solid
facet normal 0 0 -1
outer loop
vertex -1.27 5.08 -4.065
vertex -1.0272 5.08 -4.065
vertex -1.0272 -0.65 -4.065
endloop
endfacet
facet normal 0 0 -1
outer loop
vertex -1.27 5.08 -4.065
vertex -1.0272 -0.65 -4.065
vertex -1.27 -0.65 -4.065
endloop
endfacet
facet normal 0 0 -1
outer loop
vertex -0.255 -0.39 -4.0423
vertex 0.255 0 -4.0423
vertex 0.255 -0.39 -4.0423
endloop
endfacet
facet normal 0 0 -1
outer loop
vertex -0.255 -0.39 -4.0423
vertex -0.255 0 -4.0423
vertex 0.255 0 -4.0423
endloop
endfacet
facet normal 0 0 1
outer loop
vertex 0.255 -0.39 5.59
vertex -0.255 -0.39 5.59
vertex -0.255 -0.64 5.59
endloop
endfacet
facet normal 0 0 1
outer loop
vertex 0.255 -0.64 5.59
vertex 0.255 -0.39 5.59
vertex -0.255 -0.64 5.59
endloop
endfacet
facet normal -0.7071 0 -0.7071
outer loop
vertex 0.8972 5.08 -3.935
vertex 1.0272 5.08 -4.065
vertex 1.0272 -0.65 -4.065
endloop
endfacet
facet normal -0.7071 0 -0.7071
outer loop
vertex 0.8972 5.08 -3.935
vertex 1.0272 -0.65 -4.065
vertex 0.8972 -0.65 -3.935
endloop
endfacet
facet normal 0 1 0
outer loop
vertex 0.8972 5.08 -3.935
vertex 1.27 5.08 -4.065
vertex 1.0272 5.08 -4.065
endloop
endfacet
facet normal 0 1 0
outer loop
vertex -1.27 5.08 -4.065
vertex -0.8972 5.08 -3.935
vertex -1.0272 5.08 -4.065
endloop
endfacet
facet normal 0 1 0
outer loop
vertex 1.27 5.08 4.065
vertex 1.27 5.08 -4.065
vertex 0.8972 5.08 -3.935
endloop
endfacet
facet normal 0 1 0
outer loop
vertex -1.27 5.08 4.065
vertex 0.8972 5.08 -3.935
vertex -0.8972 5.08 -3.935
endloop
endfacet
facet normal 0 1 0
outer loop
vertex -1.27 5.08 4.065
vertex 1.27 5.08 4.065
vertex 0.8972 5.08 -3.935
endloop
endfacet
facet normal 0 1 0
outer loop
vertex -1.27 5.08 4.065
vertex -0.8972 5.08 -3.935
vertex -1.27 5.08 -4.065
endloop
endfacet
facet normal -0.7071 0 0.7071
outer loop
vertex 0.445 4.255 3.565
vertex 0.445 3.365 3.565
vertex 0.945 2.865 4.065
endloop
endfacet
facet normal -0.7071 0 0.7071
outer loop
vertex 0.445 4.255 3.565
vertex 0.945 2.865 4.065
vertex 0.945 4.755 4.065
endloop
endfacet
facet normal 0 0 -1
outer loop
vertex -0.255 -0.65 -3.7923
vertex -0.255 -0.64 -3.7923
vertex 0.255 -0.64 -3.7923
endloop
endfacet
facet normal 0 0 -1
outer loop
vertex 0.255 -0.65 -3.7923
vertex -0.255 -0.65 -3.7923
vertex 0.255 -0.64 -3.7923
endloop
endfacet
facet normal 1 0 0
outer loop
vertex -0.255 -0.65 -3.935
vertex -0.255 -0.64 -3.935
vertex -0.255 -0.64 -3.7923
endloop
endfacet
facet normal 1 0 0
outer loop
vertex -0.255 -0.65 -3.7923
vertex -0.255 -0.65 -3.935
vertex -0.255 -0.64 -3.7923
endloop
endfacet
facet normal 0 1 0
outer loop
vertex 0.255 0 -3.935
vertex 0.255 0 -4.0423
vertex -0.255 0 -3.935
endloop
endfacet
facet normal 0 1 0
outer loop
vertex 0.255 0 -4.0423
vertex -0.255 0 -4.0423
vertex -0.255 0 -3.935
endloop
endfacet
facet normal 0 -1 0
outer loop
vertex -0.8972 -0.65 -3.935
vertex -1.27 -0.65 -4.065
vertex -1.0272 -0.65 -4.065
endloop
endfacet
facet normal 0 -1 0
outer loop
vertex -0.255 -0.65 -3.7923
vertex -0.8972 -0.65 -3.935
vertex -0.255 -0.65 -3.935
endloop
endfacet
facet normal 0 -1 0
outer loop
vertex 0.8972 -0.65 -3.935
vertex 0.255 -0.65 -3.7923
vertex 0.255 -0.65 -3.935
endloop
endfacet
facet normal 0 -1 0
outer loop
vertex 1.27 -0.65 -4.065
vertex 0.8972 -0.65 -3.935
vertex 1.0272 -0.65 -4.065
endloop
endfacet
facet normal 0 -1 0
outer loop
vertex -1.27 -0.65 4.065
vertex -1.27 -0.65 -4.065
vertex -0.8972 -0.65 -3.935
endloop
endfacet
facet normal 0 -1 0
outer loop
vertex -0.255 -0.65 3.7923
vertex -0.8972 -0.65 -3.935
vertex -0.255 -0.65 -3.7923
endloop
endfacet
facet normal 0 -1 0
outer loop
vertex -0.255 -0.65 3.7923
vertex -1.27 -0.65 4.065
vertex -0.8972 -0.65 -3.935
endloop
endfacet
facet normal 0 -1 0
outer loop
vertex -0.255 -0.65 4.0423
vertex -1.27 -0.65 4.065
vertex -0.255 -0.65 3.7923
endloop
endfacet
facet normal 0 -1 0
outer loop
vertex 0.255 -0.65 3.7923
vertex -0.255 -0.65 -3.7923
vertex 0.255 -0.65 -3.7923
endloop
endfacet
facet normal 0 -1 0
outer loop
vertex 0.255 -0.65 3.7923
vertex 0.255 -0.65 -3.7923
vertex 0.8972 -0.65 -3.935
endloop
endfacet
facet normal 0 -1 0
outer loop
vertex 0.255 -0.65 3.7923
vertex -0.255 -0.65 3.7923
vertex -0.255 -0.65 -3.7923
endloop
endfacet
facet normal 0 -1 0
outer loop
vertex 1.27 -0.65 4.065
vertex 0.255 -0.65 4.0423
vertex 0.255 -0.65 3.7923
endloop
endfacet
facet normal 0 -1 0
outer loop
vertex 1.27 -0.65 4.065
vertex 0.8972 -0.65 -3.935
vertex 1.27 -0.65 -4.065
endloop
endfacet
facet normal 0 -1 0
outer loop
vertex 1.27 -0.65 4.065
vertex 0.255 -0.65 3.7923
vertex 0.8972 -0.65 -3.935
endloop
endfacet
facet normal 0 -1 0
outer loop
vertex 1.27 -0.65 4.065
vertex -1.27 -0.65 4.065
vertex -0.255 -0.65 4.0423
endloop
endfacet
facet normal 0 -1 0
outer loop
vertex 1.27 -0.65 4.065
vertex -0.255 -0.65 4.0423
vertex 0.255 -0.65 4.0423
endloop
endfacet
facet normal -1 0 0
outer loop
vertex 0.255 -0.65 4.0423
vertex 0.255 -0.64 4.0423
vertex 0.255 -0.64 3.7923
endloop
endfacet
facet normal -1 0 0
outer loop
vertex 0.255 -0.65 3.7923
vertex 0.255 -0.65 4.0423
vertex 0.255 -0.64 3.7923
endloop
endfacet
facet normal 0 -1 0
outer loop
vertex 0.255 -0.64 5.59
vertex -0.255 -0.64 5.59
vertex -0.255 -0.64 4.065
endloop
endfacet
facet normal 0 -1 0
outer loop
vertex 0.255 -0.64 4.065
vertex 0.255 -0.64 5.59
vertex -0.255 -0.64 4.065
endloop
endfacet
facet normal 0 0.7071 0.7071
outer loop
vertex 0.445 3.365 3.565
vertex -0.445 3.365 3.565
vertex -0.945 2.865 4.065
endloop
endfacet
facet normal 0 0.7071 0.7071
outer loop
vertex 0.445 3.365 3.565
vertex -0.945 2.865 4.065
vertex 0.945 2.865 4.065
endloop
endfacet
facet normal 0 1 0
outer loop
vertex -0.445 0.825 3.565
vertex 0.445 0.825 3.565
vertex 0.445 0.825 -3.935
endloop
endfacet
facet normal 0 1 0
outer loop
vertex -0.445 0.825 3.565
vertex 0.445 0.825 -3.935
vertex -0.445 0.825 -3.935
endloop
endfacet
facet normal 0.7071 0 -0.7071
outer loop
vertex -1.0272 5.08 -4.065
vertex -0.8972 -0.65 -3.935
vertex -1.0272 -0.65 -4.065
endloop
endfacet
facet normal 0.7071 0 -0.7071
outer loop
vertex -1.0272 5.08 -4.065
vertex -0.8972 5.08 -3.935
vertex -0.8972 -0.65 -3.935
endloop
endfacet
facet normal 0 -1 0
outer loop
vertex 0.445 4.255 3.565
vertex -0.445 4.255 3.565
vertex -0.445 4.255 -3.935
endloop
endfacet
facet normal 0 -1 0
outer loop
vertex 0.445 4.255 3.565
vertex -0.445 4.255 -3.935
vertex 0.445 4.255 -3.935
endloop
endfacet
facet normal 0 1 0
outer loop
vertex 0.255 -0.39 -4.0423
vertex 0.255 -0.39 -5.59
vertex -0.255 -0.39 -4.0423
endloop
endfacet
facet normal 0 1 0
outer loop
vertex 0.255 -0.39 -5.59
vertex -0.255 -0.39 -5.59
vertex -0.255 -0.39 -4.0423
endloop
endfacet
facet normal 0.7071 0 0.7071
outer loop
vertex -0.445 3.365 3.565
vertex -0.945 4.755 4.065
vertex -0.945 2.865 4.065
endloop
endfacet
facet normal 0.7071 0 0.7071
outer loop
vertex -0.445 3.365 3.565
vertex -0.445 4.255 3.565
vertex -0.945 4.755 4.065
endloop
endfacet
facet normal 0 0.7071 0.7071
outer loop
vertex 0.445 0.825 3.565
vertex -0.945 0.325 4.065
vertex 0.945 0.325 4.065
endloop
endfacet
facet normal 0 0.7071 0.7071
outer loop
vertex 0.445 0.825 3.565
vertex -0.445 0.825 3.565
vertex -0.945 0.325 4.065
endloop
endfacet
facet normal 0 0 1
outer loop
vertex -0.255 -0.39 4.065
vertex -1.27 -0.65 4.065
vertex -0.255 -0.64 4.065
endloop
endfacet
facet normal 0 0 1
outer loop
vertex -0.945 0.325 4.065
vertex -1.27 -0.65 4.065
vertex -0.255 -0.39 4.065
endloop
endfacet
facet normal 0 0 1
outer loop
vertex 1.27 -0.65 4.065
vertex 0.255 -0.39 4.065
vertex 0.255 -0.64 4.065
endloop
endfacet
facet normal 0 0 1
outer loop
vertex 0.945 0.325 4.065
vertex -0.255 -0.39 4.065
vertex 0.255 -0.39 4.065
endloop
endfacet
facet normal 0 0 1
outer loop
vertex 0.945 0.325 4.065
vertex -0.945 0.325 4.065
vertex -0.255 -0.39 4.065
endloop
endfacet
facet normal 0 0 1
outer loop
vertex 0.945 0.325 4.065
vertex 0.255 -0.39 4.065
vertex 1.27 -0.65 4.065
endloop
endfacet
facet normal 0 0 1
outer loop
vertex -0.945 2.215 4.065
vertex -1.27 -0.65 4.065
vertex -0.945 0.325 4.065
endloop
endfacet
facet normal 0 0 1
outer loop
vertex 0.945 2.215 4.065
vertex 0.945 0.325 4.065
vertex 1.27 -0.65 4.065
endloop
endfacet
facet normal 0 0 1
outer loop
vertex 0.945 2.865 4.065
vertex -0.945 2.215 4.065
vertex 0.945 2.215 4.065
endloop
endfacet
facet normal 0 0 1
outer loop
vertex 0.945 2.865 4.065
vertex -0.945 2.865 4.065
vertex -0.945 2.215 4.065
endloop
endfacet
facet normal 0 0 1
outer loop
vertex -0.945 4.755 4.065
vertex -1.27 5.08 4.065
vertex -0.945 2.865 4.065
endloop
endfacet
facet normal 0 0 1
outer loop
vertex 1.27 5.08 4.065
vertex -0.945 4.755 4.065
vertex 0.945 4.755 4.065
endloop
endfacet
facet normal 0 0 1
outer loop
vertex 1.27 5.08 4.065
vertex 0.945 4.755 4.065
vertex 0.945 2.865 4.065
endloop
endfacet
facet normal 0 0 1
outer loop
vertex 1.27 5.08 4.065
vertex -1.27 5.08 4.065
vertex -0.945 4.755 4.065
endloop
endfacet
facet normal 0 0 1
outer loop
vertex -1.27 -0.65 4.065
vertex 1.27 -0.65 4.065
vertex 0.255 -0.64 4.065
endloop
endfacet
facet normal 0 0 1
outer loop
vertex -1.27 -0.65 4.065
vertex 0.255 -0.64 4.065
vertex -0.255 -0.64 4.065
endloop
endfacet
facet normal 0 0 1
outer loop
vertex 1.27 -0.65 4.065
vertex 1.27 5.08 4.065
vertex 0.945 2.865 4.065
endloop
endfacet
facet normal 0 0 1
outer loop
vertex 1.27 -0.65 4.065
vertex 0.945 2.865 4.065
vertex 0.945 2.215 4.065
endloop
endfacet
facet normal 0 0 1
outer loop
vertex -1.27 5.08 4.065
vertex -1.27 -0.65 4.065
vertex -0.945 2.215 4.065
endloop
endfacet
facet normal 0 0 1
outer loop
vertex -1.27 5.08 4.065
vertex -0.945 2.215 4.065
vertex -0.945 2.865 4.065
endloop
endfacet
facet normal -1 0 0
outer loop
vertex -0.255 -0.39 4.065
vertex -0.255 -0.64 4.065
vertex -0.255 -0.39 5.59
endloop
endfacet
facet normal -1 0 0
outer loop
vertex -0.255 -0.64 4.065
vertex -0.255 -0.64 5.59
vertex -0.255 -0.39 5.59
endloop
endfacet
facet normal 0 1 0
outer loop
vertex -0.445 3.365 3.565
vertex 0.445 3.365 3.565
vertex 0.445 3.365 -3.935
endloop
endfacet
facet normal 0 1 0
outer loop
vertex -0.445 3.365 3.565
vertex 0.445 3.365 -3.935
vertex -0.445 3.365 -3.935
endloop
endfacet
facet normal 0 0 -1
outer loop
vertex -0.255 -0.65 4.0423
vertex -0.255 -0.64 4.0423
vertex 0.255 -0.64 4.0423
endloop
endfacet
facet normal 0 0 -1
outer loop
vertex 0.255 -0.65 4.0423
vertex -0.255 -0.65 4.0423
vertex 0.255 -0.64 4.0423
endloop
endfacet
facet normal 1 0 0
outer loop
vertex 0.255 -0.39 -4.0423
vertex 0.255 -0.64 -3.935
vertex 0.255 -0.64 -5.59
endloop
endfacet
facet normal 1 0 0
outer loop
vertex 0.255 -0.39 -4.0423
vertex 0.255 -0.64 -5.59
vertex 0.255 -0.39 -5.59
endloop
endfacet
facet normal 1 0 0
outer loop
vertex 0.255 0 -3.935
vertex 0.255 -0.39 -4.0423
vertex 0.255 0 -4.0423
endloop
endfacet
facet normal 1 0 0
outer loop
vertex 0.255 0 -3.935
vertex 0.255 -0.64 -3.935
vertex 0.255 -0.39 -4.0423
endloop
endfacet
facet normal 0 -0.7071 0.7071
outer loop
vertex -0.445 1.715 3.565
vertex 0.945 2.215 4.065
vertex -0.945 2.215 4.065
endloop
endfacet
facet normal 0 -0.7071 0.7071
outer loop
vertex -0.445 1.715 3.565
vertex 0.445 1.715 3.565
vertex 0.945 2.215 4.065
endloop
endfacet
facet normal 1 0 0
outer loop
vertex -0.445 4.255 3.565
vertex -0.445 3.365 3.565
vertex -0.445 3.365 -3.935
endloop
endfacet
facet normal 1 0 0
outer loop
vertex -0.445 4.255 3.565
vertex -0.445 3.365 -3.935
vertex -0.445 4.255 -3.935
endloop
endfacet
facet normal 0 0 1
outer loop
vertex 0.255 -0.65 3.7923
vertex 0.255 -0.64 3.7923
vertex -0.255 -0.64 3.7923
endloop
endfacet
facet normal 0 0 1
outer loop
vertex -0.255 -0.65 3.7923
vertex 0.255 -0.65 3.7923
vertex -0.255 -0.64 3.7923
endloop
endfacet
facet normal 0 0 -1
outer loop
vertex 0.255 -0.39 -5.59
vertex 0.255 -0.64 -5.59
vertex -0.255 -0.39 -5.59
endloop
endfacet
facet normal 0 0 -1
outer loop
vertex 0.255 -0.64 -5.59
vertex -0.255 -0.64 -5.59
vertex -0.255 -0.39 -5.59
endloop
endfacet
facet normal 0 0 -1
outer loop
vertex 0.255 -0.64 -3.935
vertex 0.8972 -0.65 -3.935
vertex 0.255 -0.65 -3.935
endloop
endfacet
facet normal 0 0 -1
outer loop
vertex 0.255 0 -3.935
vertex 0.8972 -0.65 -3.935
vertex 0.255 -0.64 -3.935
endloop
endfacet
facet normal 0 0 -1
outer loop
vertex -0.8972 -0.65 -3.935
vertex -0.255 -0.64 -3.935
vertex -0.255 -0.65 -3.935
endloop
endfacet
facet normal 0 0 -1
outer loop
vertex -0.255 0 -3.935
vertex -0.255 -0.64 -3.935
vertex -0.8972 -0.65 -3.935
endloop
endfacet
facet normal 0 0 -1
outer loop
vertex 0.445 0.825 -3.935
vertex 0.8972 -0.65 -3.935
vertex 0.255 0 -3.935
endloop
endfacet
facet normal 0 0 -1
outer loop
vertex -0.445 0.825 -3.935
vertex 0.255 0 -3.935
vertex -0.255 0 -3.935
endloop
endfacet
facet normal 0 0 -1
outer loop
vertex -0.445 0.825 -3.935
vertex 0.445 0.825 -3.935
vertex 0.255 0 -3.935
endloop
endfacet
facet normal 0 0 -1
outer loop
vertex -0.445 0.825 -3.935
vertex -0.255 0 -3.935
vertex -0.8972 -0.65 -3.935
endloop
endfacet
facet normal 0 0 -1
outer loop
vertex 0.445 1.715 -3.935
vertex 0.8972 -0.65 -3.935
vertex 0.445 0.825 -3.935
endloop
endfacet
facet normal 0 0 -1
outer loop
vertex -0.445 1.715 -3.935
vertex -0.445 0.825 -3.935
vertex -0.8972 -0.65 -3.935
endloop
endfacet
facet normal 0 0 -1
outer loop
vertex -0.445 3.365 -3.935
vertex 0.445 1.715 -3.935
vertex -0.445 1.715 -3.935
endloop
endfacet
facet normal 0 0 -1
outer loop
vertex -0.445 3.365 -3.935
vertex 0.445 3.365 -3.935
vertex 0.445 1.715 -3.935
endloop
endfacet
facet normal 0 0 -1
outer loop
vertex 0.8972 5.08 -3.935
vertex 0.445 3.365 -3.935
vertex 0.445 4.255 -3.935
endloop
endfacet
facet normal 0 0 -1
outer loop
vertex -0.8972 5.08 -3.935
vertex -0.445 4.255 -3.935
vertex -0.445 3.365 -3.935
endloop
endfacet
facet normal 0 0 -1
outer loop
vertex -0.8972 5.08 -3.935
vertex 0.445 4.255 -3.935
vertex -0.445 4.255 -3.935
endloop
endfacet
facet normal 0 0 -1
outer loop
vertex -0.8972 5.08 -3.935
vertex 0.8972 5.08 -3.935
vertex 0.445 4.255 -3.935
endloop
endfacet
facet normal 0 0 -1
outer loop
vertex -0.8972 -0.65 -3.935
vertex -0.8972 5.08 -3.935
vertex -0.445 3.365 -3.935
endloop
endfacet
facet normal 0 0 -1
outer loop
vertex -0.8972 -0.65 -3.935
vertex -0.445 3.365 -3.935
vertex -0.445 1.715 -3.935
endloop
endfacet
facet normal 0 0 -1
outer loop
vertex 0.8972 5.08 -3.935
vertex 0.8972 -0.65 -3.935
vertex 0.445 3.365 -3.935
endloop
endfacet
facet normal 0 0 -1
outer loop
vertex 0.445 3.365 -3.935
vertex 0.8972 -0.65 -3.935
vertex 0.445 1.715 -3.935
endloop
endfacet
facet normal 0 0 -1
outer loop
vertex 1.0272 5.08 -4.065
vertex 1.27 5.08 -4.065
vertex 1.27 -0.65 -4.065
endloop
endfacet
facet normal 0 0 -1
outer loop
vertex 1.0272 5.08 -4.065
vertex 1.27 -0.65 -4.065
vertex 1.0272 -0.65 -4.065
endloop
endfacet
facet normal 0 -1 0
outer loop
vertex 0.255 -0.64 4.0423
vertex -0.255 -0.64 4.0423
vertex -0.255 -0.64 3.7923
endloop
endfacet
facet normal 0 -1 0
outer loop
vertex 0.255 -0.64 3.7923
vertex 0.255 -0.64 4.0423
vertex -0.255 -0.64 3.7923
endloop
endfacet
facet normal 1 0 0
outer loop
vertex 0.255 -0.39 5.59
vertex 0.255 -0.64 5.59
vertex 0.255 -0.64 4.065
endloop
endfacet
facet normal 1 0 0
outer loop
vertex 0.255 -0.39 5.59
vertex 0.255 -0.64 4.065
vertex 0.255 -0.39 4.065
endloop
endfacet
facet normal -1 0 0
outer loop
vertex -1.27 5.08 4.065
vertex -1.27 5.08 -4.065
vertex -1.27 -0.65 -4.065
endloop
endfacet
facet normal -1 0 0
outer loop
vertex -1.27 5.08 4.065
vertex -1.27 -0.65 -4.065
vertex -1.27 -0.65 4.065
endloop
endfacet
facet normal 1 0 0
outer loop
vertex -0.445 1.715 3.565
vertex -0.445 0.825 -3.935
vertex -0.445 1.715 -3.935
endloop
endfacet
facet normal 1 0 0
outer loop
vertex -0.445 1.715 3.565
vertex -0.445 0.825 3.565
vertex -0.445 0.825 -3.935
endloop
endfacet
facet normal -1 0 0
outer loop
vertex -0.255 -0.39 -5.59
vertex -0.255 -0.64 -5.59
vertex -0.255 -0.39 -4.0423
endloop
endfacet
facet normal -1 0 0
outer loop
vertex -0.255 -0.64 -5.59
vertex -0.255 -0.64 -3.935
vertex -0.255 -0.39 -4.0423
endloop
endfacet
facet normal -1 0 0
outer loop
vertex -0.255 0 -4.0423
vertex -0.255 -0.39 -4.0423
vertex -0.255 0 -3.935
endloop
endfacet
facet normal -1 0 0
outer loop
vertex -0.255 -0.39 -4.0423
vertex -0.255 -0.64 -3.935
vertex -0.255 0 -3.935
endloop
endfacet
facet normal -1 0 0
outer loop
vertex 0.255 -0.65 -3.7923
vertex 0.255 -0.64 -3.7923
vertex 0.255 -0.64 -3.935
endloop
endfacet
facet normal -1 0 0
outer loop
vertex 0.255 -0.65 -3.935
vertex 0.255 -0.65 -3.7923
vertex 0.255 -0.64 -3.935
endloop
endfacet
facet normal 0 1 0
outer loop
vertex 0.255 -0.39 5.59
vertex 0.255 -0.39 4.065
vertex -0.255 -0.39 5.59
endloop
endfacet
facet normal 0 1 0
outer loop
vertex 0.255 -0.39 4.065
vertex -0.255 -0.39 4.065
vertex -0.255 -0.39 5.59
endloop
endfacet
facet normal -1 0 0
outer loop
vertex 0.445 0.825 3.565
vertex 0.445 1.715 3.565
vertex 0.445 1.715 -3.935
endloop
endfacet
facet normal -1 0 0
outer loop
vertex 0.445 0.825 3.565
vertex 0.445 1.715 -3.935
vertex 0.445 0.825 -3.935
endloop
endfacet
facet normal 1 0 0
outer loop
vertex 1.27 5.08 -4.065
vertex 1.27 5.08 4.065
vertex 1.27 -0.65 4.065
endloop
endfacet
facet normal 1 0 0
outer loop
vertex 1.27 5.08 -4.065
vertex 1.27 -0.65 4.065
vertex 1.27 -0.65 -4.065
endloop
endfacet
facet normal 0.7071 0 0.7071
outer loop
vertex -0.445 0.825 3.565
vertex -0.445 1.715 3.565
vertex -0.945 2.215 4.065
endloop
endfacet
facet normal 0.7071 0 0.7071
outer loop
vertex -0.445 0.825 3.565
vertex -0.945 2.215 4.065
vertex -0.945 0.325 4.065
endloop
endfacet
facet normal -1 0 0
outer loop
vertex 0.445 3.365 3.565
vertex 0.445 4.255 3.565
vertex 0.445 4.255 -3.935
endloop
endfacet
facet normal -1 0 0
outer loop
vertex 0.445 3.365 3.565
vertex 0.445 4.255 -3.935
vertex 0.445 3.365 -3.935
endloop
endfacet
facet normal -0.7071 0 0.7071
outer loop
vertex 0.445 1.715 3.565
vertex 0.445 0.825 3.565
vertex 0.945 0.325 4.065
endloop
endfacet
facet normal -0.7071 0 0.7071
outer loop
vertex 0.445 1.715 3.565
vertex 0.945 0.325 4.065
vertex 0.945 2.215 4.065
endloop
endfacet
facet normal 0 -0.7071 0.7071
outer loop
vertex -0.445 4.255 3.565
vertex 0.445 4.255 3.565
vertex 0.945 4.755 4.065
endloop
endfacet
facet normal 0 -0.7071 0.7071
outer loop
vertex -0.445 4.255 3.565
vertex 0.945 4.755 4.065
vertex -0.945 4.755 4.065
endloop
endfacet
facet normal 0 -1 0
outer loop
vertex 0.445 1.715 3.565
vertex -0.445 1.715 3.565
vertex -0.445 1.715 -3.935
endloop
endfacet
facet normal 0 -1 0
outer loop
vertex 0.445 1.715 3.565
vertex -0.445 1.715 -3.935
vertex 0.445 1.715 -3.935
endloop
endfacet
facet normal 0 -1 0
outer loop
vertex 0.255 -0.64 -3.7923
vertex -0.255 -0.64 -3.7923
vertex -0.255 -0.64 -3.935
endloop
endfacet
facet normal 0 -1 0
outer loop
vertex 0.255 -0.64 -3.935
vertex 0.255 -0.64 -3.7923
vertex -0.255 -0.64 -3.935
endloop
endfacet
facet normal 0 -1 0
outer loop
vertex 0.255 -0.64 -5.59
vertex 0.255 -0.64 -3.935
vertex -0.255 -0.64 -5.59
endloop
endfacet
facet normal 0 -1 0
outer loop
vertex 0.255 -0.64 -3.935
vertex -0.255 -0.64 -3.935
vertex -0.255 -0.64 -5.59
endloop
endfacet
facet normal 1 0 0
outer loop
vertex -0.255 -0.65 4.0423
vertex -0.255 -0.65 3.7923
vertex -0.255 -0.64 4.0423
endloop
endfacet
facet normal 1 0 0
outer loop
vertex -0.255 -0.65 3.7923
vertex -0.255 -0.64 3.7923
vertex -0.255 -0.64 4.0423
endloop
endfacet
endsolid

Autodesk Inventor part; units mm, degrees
ref_plane "YZ Plane" through (0, 0, 0) normal (1, 0, 0) x (0, 1, 0)
ref_plane "XZ Plane" through (0, 0, 0) normal (0, 1, 0) x (-1, 0, 0)
sketch "Sketch1" plane through (0, 0, 0) normal (0, 1, 0) x (-1, 0, 0)
  line L0 (-1.27, -4.065) -> (-1.27, 4.065)
  line L1 (-1.27, 4.065) -> (1.27, 4.065)
  line L2 (1.27, 4.065) -> (1.27, -4.065)
  line L3 (1.0272, -4.065) -> (0.8972, -3.935)
  line L4 (0.8972, -3.935) -> (-0.8972, -3.935)
  line L5 (-0.8972, -3.935) -> (-1.0272, -4.065)
  line L6 (1.27, -4.065) -> (1.0272, -4.065)
  line L7 (-1.0272, -4.065) -> (-1.27, -4.065)
  line L8 (0, -2.6831) -> (0, -0.9898) construction
  point P0 (0, 0)
  point P1 (0, 4.065)
  point P2 (1.27, 0)
  point P3 (0, -3.935)
  dimension "d1" = 2.54
  dimension "d2" = 0.13
  dimension "d3" = 8.13
  dimension "d4" = 45
extrude "Extrusion1" add sketch "Sketch1" along normal blind 5.08
sketch "Sketch2" plane through (-1.27, 0, 4.065) normal (0, 0, 1) x (1, 0, 0)
  line L0 (0.825, 4.255) -> (1.715, 4.255)
  line L1 (1.715, 4.255) -> (1.715, 3.365)
  line L2 (1.715, 3.365) -> (0.825, 3.365)
  line L3 (0.825, 3.365) -> (0.825, 4.255)
  line L4 (0.825, 1.715) -> (1.715, 1.715)
  line L5 (1.715, 1.715) -> (1.715, 0.825)
  line L6 (1.715, 0.825) -> (0.825, 0.825)
  line L7 (0.825, 0.825) -> (0.825, 1.715)
  line L8 (0.4511, 3.81) -> (2.2201, 3.81) construction
  line L9 (2.2201, 1.27) -> (0.4335, 1.27) construction
  line L10 (0, 0) -> (2.54, 0) projected
  line L11 (2.54, 0) -> (2.54, 5.08) projected
  line L12 (0, 5.08) -> (2.54, 5.08) projected
  line L13 (0, 0) -> (0, 5.08) projected
  point P0 (1.27, 0)
  point P1 (0.825, 3.81)
  point P2 (0.825, 1.27)
  point P3 (1.27, 5.08)
  point P4 (1.27, 4.255)
  point P5 (1.27, 1.715)
  dimension "d7" = 2.54
  dimension "d8" = 0.89
  dimension "d9" = 1.27
extrude "Extrusion2" cut sketch "Sketch2" against normal blind 8 contours L0 L1 L2 L3 | L4 L5 L6 L7
sketch "Sketch3" plane through (0, 0, 0) normal (1, 0, 0) x (0, 1, 0)
  line L0 (0, 4.065) -> (5.08, 4.065) projected
  line L1 (5.08, -4.065) -> (5.08, 4.065) projected
  line L2 (0, -3.935) -> (5.08, -3.935) projected
  line L3 (-0.39, 5.59) -> (-0.64, 5.59)
  line L4 (-0.64, 5.59) -> (-0.64, 3.7923)
  line L5 (-0.64, 3.7923) -> (-0.2868, 3.7923)
  line L6 (-0.39, 4.0423) -> (-0.39, 5.59)
  line L7 (-0.39, -3.7923) -> (-0.64, -3.7923)
  line L8 (-0.64, -3.7923) -> (-0.64, -5.59)
  line L9 (-0.64, -5.59) -> (-0.39, -5.59)
  line L10 (-0.39, -5.59) -> (-0.39, -4.0423)
  line L11 (-1.3876, 0) -> (-0.3881, 0) construction
  line L12 (0, -4.065) -> (0, 4.065) projected
  line L13 (-0.39, -3.7923) -> (0, -3.7923)
  line L14 (0, -3.7923) -> (0, -4.0423)
  line L15 (0, -4.0423) -> (-0.39, -4.0423)
  line L16 (-0.39, 4.0423) -> (0, 4.0423)
  line L17 (0, 4.0423) -> (0, 3.7923)
  line L18 (0, 3.7923) -> (-0.2868, 3.7923)
  point P0 (0, 0)
  dimension "d30" = 0.25
  dimension "d31" = 11.18
  dimension "d34" = 5.72
ref_plane "Work Plane1" through (-1.27, 0, 3.94) normal (0, 0, 1) x (1, 0, 0)
extrude "Extrusion3" add sketch "Sketch3" along normal mid plane 0.51 contours L12 L18 L5 L4 L3 L6 L16 | L12 L15 L10 L9 L8 L7 L13
chamfer "Chamfer1" distance 0.5 angle 45 8 edges at (0.445, 3.81, 4.065) (0, 3.365, 4.065) (-0.445, 3.81, 4.065) (0, 4.255, 4.065) (0, 1.715, 4.065) (0.445, 1.27, 4.065) (0, 0.825, 4.065) (-0.445, 1.27, 4.065)
ref_plane "Work Plane3" through (-0.255, -0.64, 0) normal (0, 0, 1) x (1, 0, 0)
sketch "Sketch6" plane through (0, 0, 0) normal (0, -1, 0) x (1, 0, 0)
  line L0 (0.255, -3.7923) -> (0.255, -3.935) projected
  line L1 (0.8972, -3.935) -> (0.255, -3.935) projected
  line L2 (1.0272, -4.065) -> (0.8972, -3.935) projected
  line L3 (1.27, -4.065) -> (1.0272, -4.065) projected
  line L4 (1.27, 4.065) -> (1.27, -4.065) projected
  line L5 (-1.27, 4.065) -> (1.27, 4.065) projected
  line L6 (-1.27, -4.065) -> (-1.27, 4.065) projected
  line L7 (-1.0272, -4.065) -> (-1.27, -4.065) projected
  line L8 (-0.8972, -3.935) -> (-1.0272, -4.065) projected
  line L9 (-0.255, -3.935) -> (-0.8972, -3.935) projected
  line L10 (-0.255, -3.935) -> (-0.255, -3.7923) projected
  line L11 (-0.255, -3.7923) -> (0.255, -3.7923) projected
  line L12 (-0.255, 3.7923) -> (-0.255, 4.0423) projected
  line L13 (-0.255, 4.0423) -> (0.255, 4.0423) projected
  line L14 (0.255, 4.0423) -> (0.255, 3.7923) projected
  line L15 (0.255, 3.7923) -> (-0.255, 3.7923) projected
  point P0 (0, 0)
extrude "Extrusion4" add sketch "Sketch6" along normal blind 0.65
properties part number "SSM-101-F-DH"
